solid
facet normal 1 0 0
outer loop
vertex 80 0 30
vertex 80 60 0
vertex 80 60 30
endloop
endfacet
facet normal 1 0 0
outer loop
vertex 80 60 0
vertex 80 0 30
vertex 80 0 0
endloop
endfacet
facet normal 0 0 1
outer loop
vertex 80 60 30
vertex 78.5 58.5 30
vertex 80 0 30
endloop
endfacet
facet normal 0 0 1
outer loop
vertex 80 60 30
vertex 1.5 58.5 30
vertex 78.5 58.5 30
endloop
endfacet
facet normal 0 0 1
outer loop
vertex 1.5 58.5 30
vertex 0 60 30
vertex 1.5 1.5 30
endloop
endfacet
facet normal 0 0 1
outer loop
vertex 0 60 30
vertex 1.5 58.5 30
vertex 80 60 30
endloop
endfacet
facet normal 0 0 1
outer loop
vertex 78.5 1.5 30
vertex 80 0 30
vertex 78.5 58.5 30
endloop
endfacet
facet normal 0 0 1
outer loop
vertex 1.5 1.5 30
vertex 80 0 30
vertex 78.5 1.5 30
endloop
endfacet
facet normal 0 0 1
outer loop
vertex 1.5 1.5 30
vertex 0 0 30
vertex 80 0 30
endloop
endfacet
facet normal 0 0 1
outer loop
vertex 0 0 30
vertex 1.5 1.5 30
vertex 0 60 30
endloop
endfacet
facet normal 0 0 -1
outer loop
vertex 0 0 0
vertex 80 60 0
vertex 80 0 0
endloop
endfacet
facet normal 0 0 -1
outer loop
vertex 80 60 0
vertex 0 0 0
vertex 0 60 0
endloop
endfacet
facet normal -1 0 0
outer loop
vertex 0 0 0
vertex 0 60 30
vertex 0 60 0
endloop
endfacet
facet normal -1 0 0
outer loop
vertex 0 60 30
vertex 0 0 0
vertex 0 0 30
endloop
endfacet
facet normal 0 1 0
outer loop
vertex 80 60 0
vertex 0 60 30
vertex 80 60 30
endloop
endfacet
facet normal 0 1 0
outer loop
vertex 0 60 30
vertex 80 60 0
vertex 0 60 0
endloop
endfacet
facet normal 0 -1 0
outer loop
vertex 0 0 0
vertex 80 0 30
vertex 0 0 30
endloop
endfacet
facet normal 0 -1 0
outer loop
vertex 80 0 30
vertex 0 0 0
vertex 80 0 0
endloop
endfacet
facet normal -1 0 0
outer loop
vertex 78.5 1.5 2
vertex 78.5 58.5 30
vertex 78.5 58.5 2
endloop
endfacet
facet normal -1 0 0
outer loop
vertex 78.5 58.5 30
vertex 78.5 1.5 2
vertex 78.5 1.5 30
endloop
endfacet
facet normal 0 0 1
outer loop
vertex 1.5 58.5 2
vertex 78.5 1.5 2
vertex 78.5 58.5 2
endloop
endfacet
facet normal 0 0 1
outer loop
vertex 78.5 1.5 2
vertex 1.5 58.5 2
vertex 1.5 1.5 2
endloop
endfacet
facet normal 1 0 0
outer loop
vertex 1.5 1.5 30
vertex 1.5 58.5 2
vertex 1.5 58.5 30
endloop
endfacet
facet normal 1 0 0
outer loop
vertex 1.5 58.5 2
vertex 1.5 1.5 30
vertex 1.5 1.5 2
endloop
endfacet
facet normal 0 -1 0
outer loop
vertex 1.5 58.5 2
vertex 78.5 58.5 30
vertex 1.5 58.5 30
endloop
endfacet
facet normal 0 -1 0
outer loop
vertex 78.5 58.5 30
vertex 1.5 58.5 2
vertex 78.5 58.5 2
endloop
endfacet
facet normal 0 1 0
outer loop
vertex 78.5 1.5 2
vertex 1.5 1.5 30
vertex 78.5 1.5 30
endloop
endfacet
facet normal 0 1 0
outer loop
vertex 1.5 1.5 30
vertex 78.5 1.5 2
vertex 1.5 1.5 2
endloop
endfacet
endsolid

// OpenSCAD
$fn = 32;

// ----------------------------------------------------------------------
// Open box: 1.5 mm walls
// ----------------------------------------------------------------------

// --- parameters (mm) ---
box_l = 80;               // outer length, X
box_w = 60;               // outer width, Y
box_h = 30;               // outer height, Z
wall = 1.5;               // wall thickness
floor = 2;                // floor thickness

difference() {
  cube([box_l, box_w, box_h]);
  translate([wall, wall, floor])
    cube([box_l - 2 * wall, box_w - 2 * wall, box_h]);
}
